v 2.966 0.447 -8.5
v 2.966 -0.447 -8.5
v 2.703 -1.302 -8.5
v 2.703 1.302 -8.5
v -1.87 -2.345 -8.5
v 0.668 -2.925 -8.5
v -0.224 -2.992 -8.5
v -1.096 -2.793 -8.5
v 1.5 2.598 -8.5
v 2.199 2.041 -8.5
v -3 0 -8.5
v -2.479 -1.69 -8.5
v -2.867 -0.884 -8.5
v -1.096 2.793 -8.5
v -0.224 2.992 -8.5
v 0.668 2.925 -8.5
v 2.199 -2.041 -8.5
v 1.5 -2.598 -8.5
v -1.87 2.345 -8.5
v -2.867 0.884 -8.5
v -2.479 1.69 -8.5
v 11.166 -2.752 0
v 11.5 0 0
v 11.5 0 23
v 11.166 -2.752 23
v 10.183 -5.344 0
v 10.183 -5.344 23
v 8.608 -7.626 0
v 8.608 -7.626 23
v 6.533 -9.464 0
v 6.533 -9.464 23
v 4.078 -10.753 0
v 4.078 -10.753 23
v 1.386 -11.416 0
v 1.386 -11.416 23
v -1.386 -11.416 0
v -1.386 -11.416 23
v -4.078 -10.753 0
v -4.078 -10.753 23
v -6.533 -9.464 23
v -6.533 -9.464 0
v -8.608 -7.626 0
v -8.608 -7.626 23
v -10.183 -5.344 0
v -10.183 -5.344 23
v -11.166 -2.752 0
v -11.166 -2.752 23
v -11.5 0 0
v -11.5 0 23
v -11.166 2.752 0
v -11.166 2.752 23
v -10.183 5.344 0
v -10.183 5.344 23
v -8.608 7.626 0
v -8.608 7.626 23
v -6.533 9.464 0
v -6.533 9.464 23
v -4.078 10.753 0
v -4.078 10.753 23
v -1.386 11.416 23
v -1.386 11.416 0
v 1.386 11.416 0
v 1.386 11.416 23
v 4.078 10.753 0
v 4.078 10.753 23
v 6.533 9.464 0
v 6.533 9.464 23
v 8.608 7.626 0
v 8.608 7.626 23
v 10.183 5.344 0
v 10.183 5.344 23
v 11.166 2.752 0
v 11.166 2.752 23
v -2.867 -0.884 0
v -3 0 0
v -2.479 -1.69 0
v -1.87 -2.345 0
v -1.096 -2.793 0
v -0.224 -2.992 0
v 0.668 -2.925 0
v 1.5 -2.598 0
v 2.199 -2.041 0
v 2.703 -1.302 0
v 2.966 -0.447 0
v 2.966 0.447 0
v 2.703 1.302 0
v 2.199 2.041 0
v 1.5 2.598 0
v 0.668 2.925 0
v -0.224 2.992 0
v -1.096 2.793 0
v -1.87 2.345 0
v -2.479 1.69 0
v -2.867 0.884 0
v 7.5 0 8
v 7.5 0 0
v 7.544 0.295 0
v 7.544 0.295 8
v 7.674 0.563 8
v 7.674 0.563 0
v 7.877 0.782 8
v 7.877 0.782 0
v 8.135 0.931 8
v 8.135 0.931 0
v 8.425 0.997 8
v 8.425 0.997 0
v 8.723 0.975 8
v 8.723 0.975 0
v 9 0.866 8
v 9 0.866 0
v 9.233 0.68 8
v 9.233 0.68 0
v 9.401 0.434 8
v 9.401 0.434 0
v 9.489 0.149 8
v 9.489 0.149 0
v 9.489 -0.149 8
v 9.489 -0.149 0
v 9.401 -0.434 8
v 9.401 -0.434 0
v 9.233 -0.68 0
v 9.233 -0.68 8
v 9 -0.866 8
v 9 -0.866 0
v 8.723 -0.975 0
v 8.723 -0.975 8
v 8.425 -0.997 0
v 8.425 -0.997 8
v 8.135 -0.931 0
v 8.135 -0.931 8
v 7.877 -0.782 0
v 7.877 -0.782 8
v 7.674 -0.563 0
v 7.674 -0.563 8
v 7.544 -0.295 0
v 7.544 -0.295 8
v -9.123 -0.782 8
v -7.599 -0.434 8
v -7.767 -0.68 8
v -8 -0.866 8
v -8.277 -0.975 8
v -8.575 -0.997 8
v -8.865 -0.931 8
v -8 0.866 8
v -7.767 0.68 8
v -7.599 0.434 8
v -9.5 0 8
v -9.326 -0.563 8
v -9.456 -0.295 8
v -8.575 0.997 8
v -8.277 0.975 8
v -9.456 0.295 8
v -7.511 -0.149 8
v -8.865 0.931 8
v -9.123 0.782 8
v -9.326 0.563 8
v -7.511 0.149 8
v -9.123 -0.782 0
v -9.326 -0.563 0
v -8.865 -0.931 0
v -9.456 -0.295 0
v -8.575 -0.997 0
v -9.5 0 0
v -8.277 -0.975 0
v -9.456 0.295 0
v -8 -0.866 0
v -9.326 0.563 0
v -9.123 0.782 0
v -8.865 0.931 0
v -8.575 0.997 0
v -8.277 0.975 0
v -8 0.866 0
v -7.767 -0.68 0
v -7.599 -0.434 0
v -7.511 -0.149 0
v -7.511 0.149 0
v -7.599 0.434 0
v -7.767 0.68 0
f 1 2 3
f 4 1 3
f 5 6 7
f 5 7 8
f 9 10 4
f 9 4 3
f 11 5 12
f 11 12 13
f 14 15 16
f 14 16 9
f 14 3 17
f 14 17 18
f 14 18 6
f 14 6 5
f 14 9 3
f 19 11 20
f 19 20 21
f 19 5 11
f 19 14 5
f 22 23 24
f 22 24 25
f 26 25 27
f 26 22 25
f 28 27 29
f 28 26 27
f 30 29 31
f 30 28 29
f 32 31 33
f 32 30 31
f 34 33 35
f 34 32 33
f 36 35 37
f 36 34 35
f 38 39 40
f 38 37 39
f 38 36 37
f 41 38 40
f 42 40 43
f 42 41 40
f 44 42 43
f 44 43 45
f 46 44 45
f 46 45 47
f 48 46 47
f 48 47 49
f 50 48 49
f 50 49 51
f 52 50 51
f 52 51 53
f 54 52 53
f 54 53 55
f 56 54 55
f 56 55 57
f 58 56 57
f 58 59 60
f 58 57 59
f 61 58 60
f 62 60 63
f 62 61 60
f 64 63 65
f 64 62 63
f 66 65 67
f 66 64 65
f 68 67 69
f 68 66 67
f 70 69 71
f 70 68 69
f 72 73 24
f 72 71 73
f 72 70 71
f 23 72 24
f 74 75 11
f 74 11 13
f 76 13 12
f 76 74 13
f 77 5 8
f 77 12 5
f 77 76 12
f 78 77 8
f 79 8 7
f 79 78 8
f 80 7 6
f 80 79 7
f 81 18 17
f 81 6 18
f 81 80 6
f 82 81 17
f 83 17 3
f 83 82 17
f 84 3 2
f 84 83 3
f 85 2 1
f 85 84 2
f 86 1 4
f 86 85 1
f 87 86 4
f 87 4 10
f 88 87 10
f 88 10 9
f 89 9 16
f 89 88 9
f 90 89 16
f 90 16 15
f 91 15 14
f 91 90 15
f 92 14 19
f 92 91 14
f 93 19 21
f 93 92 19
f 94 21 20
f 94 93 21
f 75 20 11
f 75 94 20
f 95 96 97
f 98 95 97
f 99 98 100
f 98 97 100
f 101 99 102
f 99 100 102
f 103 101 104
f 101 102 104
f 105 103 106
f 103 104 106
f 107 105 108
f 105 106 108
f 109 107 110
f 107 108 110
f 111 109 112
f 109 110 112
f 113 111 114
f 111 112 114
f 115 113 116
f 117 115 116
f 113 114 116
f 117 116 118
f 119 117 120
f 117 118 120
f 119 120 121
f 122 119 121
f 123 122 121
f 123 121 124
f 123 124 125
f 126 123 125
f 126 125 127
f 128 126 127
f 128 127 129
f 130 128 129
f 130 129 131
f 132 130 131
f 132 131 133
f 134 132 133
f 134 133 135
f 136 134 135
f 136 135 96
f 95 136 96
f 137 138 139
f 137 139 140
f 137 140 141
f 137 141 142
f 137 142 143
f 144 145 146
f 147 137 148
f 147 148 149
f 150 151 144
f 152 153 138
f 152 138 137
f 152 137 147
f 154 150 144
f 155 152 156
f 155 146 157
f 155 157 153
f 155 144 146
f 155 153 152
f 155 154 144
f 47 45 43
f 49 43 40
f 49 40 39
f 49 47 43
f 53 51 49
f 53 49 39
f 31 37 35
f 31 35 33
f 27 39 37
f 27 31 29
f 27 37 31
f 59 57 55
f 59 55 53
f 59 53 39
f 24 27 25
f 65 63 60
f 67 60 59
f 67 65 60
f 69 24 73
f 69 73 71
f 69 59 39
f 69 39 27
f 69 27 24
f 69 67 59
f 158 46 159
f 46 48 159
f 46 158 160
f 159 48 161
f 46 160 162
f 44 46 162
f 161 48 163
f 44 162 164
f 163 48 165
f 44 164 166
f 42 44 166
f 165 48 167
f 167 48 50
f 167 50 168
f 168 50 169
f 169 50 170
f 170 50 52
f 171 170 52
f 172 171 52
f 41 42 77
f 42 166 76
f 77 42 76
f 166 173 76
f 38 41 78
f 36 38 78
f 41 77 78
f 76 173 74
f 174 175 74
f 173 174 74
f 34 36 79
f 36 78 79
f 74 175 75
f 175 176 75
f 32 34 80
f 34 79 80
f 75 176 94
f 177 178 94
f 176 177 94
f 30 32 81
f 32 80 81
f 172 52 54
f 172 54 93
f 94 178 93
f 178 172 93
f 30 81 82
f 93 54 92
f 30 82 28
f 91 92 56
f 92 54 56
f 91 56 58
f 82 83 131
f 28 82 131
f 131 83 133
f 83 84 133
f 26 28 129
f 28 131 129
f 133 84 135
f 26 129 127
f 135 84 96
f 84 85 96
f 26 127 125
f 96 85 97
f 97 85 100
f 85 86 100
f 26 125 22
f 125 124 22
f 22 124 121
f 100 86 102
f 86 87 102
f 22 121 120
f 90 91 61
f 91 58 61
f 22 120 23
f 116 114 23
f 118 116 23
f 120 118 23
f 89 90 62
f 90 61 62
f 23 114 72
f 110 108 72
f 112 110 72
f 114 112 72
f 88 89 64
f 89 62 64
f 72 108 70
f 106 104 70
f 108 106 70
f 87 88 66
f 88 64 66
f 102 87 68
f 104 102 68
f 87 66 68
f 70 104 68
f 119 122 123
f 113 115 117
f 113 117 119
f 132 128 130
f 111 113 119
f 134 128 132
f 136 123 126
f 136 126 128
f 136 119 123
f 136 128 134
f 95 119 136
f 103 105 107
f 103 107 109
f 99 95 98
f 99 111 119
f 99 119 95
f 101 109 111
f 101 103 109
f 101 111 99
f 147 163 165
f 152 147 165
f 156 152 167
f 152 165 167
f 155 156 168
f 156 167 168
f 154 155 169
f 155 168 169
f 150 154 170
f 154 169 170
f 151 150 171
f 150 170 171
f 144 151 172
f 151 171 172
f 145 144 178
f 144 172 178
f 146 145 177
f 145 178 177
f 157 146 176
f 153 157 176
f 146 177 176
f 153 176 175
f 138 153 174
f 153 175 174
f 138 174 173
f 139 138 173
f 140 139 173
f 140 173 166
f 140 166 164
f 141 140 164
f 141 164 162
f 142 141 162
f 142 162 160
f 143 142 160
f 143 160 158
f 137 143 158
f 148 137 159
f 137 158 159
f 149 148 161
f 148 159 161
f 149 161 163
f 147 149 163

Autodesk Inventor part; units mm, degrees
ref_plane "YZ Plane" through (0, 0, 0) normal (1, 0, 0) x (0, 1, 0)
ref_plane "XZ Plane" through (0, 0, 0) normal (0, 1, 0) x (-1, 0, 0)
ref_plane "XY Plane" through (0, 0, 0) normal (0, 0, 1) x (1, 0, 0)
sketch "Sketch1" plane through (0, 0, 0) normal (0, 0, 1) x (1, 0, 0)
  circle A0 centre (0, 0) radius 11.5
  dimension "d0" = 23
extrude "Extrusion1" add sketch "Sketch1" along normal blind 23
sketch "Sketch2" plane through (0, 0, 0) normal (0, 0, -1) x (-1, 0, 0)
  circle A0 centre (8.5, 0) radius 1
  circle A1 centre (-8.5, 0) radius 1
  point P0 (0, 0)
  dimension "d3" = 2
  dimension "d4" = 8.5
  dimension "d7" = 360
extrude "Extrusion2" cut sketch "Sketch2" against normal blind 8
sketch "Sketch3" plane through (0, 0, 0) normal (0, 0, -1) x (-1, 0, 0)
  circle A0 centre (0, 0) radius 3
  dimension "d11" = 6
extrude "Extrusion3" add sketch "Sketch3" along normal blind 8.5
properties part number "AEAT-6012"
